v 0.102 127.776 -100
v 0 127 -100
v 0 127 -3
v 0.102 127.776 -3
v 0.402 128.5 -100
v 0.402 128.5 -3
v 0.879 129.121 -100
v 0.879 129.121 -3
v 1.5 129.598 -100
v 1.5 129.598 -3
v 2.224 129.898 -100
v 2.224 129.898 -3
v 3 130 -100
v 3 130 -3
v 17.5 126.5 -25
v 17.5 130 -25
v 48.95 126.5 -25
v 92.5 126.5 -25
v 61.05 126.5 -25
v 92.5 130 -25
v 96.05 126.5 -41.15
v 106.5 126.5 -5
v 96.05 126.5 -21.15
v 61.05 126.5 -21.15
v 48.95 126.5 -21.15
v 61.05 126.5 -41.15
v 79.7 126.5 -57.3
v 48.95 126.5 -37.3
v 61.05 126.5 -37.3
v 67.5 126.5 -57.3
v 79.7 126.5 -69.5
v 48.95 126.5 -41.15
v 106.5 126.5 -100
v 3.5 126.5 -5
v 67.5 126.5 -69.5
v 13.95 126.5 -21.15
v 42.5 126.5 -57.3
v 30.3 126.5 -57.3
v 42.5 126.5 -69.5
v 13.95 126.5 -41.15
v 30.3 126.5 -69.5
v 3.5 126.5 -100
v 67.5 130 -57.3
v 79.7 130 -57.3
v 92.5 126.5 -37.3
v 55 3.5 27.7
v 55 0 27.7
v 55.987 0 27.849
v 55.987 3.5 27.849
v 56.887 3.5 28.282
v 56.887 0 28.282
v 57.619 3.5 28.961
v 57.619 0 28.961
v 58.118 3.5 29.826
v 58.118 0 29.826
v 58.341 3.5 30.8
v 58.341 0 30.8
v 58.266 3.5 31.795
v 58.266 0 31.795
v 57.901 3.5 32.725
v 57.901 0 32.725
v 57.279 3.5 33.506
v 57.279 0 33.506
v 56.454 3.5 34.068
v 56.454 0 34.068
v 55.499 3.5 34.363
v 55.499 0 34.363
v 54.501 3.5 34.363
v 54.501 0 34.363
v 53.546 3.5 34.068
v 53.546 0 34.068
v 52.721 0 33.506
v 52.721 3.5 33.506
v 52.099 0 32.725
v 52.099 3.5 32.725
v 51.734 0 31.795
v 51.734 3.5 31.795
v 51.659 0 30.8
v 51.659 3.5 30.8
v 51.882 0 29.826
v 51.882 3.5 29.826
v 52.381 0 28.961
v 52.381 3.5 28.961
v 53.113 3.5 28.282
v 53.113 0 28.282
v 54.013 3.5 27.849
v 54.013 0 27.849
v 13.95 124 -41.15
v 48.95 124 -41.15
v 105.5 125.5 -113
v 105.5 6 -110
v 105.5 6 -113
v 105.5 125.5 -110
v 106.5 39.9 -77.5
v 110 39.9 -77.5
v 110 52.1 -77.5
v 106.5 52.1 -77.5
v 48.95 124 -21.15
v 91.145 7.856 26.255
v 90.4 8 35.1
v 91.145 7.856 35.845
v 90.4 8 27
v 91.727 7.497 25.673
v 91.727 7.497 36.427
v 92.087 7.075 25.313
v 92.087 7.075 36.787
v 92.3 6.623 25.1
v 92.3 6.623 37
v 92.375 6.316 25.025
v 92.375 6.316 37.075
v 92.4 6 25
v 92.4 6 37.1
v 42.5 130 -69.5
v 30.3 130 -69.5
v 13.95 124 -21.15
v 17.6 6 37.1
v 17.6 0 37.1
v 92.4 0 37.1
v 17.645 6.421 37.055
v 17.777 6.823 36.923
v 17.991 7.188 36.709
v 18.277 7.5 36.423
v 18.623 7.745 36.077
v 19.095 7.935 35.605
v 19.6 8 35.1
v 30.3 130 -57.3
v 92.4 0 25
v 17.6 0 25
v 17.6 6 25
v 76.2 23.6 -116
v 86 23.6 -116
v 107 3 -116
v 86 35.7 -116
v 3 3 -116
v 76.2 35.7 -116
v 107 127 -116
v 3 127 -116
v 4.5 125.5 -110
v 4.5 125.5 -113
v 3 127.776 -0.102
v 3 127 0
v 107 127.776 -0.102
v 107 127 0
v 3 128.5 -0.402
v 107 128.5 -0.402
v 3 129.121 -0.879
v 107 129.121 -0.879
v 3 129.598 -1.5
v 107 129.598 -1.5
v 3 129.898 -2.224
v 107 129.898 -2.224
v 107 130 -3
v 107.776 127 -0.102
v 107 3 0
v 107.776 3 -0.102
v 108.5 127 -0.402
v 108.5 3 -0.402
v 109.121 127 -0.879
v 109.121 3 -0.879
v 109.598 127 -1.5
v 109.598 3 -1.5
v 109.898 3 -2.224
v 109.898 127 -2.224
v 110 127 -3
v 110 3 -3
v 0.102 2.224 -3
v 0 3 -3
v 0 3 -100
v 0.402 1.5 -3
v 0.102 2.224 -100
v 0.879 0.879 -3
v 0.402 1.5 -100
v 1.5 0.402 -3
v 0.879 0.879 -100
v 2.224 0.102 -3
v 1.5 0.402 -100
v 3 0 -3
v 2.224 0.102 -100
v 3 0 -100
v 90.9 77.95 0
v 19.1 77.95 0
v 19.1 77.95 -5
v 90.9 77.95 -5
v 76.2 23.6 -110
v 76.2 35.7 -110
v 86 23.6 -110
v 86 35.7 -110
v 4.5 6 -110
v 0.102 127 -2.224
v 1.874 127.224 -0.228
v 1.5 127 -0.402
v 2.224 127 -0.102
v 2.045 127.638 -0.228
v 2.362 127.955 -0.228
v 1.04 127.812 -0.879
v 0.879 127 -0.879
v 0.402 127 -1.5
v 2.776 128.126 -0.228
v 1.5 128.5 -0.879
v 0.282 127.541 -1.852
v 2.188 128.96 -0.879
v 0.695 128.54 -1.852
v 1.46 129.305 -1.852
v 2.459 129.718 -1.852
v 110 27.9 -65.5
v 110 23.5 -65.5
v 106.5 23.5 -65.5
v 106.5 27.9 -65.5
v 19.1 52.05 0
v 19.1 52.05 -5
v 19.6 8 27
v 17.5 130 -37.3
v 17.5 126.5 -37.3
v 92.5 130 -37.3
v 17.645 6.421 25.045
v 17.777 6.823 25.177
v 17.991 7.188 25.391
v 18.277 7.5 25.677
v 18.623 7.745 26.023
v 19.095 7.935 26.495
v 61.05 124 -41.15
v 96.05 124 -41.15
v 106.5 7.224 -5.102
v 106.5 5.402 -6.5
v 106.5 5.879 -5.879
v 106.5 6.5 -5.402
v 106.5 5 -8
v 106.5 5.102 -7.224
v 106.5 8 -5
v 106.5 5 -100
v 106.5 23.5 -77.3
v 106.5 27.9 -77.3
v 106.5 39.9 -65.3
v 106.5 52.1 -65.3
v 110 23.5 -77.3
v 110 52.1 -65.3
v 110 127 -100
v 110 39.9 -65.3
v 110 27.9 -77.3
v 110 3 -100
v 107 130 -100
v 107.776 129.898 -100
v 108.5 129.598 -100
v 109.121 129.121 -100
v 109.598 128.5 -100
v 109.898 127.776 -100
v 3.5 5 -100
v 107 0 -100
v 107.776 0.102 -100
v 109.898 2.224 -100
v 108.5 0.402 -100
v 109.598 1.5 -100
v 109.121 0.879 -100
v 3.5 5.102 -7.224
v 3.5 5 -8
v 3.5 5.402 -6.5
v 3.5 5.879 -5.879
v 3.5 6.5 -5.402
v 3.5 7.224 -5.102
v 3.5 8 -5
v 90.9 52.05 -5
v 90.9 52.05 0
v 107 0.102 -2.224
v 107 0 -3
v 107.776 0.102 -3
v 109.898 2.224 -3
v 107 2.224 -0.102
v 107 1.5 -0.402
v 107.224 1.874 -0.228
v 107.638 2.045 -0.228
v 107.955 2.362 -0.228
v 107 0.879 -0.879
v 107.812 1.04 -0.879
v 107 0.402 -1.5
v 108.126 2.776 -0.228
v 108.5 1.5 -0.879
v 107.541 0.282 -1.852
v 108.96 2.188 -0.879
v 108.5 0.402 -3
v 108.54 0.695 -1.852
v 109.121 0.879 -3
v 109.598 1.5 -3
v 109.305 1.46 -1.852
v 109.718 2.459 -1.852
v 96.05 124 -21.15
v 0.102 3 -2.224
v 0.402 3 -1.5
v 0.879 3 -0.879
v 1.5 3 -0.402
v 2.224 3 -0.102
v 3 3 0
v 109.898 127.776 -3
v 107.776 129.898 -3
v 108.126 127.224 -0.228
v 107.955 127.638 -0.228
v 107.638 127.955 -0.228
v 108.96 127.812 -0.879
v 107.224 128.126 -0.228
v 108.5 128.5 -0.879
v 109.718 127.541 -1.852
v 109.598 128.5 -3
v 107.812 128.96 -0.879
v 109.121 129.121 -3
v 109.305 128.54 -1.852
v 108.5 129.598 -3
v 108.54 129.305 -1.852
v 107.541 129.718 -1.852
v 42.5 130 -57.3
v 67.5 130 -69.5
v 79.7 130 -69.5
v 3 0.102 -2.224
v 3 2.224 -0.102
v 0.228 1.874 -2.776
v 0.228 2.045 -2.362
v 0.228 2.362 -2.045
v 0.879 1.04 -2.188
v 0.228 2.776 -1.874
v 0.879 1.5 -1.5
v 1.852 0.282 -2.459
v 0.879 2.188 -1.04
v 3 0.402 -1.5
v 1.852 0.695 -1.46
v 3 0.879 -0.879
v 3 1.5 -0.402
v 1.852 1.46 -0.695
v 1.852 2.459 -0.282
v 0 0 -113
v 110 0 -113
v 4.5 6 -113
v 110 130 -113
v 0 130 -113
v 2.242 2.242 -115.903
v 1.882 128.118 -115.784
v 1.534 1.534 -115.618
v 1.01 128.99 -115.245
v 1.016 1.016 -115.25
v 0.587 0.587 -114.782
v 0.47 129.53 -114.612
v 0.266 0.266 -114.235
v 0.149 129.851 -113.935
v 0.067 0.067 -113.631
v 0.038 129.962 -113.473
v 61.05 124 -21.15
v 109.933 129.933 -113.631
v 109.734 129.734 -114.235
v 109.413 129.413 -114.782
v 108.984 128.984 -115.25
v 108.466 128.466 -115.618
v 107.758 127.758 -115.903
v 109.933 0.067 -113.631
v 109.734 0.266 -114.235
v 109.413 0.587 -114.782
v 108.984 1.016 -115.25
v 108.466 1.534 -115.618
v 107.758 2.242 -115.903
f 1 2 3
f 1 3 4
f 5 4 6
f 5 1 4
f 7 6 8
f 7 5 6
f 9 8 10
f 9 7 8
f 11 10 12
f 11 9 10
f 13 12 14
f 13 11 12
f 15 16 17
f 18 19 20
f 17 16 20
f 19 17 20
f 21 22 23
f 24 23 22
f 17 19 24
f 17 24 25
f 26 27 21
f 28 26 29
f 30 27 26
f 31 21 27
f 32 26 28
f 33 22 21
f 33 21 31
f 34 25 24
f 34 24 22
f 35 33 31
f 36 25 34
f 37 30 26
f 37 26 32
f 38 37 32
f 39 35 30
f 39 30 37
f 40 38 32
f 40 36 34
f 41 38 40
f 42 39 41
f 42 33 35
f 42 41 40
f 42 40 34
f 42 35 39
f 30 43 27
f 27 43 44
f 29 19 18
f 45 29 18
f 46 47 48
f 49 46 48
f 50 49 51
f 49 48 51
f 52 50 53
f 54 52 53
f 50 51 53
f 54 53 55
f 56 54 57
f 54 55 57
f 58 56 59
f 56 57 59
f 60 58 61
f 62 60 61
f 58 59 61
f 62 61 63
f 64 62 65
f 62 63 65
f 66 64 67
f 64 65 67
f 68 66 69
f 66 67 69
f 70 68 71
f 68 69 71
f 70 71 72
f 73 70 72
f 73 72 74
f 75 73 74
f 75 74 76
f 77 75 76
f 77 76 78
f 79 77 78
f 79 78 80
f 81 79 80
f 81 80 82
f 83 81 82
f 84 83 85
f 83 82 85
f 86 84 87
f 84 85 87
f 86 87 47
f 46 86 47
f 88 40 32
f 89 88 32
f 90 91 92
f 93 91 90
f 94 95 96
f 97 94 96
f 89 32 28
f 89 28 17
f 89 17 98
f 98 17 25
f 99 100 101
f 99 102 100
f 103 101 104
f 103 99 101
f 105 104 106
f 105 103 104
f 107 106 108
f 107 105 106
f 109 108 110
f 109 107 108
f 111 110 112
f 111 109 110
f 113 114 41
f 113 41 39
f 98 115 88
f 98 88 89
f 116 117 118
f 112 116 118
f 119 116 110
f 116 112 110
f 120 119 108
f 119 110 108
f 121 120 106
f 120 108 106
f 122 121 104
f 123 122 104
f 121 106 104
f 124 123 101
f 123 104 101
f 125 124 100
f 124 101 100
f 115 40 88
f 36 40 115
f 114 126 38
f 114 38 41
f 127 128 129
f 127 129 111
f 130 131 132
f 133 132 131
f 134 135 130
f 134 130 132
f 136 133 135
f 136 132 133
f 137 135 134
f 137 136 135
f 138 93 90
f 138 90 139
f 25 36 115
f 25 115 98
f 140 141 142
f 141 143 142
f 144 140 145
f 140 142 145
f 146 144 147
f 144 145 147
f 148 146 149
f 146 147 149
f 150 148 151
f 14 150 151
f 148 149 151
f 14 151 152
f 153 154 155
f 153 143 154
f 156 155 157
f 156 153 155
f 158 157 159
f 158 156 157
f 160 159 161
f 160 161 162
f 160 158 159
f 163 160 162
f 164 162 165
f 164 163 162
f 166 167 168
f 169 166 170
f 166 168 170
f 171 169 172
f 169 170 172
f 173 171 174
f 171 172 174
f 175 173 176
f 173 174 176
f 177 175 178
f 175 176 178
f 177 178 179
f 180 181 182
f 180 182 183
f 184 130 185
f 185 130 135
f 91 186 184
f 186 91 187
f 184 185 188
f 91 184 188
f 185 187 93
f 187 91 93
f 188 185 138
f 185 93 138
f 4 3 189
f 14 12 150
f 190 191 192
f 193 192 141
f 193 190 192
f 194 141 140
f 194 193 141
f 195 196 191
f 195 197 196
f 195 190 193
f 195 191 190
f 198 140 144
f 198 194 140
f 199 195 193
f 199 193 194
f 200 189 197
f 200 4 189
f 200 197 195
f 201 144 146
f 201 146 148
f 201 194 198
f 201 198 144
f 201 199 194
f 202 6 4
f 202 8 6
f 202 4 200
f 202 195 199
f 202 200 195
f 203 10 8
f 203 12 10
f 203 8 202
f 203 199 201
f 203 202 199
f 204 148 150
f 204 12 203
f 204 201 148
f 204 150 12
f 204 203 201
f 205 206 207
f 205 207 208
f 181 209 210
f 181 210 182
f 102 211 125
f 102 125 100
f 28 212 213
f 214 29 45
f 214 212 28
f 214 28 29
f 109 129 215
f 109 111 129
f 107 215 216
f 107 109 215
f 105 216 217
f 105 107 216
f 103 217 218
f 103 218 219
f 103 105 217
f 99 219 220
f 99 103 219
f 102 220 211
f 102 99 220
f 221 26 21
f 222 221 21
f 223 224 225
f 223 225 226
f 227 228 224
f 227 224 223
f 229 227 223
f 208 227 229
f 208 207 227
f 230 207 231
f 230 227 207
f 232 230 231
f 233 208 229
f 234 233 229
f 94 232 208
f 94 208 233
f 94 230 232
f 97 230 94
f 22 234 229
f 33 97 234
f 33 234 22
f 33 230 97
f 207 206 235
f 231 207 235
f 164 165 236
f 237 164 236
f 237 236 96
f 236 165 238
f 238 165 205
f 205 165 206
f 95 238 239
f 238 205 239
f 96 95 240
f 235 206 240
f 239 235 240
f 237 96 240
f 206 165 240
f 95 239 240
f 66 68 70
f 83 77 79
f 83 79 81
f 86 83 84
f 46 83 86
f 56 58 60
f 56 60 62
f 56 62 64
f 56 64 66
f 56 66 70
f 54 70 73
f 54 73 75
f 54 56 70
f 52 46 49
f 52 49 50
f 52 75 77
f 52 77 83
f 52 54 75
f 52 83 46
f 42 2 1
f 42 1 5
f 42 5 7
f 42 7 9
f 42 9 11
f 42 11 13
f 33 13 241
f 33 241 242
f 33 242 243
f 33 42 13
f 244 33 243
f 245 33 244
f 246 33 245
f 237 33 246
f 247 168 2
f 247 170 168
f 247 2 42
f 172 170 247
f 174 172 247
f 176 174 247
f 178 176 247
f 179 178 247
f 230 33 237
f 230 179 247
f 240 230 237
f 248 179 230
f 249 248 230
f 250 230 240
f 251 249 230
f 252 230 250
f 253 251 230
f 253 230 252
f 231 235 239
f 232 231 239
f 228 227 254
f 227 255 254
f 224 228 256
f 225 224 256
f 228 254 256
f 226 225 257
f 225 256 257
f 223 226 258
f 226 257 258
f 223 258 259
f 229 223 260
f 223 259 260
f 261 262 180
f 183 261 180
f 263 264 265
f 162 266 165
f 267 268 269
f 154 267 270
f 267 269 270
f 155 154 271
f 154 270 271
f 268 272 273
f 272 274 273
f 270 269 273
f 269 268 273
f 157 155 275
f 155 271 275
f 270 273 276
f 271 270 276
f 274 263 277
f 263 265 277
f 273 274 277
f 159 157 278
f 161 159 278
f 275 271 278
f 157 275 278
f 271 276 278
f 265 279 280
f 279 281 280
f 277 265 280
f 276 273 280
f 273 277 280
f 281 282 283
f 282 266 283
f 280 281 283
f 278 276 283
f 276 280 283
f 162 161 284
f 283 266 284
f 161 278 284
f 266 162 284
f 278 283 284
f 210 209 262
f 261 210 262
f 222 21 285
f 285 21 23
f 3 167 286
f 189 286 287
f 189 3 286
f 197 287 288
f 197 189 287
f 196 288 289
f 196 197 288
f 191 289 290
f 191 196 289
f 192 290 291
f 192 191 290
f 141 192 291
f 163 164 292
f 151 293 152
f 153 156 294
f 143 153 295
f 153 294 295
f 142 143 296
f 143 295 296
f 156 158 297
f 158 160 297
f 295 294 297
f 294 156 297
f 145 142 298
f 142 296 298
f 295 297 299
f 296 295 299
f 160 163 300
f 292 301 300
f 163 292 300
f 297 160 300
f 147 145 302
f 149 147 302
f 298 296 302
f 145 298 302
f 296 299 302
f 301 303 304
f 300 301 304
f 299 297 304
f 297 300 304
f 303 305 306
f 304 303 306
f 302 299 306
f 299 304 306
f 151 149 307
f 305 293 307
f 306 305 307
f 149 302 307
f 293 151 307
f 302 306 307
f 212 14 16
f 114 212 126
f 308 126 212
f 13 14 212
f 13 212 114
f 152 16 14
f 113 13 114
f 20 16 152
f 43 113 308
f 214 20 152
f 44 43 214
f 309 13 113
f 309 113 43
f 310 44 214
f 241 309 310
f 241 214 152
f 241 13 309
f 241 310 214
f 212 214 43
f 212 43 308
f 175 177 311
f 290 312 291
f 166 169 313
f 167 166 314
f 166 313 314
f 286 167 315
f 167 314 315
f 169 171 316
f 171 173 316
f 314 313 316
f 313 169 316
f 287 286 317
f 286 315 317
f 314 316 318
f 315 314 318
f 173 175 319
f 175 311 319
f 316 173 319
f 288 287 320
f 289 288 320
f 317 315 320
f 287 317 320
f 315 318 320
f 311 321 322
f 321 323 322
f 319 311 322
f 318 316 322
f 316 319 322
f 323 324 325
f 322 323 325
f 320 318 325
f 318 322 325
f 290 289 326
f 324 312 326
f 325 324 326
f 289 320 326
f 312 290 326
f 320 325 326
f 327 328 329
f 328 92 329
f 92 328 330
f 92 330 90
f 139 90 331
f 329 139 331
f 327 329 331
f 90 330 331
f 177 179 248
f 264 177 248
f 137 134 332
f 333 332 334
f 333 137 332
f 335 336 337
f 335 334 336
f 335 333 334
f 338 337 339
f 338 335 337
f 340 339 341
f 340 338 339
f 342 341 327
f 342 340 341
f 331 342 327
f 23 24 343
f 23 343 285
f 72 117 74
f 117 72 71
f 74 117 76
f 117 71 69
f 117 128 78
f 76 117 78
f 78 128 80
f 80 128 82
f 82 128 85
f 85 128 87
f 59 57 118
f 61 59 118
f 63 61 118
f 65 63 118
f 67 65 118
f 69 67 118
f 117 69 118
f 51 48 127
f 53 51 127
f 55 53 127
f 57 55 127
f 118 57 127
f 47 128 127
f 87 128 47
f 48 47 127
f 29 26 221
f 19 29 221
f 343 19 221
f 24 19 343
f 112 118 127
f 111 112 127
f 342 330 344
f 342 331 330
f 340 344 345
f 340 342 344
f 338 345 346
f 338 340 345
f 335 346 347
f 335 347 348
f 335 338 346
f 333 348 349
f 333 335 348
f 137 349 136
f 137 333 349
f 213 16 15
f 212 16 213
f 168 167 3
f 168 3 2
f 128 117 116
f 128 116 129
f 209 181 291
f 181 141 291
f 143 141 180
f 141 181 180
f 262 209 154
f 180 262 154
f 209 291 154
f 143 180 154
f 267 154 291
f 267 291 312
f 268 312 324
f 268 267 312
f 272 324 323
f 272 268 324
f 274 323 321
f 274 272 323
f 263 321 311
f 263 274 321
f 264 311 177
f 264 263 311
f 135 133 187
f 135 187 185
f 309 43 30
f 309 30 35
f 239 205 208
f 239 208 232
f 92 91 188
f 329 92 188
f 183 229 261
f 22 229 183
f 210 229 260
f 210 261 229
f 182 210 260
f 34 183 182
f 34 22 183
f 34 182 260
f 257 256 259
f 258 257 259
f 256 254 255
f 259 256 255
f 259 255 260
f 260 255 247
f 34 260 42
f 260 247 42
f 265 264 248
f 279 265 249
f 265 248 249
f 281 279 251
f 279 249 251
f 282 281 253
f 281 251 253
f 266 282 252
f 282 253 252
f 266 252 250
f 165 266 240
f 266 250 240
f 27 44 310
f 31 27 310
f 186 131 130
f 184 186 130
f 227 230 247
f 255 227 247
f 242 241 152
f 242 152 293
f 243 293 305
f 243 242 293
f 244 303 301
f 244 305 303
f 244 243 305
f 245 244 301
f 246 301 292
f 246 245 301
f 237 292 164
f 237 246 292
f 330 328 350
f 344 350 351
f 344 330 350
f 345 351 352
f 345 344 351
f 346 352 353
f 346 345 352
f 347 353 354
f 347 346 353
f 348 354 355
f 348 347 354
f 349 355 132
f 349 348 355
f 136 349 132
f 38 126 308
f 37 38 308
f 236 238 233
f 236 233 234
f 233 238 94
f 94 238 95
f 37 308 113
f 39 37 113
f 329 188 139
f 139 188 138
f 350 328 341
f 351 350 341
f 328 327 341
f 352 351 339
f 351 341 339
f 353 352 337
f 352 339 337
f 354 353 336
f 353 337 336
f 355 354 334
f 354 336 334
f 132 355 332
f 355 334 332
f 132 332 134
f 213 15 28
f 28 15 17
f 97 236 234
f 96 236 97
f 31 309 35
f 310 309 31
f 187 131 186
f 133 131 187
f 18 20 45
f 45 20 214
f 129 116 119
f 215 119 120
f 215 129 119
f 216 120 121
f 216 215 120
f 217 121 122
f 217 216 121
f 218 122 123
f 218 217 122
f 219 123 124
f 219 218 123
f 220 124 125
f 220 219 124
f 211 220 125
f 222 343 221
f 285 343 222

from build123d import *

# Parameters (mm, degrees)
SKETCH1_W           = 110
SKETCH1_H           = 100
BOSS_EXTRUDE1_DEPTH = 130
SKETCH2_W           = 103
SKETCH2_H           = 121.5
CUT_EXTRUDE1_DEPTH  = 95
SKETCH3_W           = 71.8
SKETCH3_H           = 25.9
CUT_EXTRUDE2_DEPTH  = 5
SKETCH4_W           = 75
SKETCH4_H           = 12.3
SKETCH4_W_2         = 12.2
SKETCH4_H_2         = 12.2
CUT_EXTRUDE3_DEPTH  = 3.5
SKETCH5_W           = 101
SKETCH5_H           = 119.5
BOSS_EXTRUDE2_DEPTH = 3
SKETCH7_W           = 110
SKETCH7_H           = 130
BOSS_EXTRUDE3_DEPTH = 3
SKETCH8_W           = 11.8
SKETCH8_H           = 4.4
SKETCH8_W_2         = 12.2
SKETCH8_H_2         = 12.2
CUT_EXTRUDE4_DEPTH  = 3.5
SKETCH9_W           = 9.8
SKETCH9_H           = 12.1
CUT_EXTRUDE5_DEPTH  = 6
SKETCH10_W          = 74.8
SKETCH10_H          = 12.1
BOSS_EXTRUDE4_DEPTH = 8
SKETCH11_R          = 3.35
CUT_EXTRUDE6_DEPTH  = 3.5
FILLET1_R           = 3
FILLET2_R           = 3
FILLET3_R           = 2
SKETCH13_W          = 35
SKETCH13_H          = 20
BOSS_EXTRUDE5_DEPTH = 2.5


with BuildPart() as part:
    # Sketch1 → Boss-Extrude1 (new body)
    with BuildSketch(Plane(origin=(0, 0, 0), x_dir=(1, 0, 0), z_dir=(0, 1, 0))):
        with Locations((55, 50)):
            Rectangle(SKETCH1_W, SKETCH1_H)
    extrude(amount=BOSS_EXTRUDE1_DEPTH)

    # Sketch2 → Cut-Extrude1 (cut)
    with BuildSketch(Plane(origin=(0, 0, -100), x_dir=(-1, 0, 0), z_dir=(0, 0, -1))):
        with Locations((-55, 65.75)):
            Rectangle(SKETCH2_W, SKETCH2_H)
    extrude(amount=-CUT_EXTRUDE1_DEPTH, mode=Mode.SUBTRACT)

    # Sketch3 → Cut-Extrude2 (cut)
    with BuildSketch(Plane.XY):
        with Locations((55, 65)):
            Rectangle(SKETCH3_W, SKETCH3_H)
    extrude(amount=-CUT_EXTRUDE2_DEPTH, mode=Mode.SUBTRACT)

    # Sketch4 → Cut-Extrude3 (cut)
    with BuildSketch(Plane(origin=(0, 130, 0), x_dir=(1, 0, 0), z_dir=(0, 1, 0))):
        with Locations((55, 31.15)):
            Rectangle(SKETCH4_W, SKETCH4_H)
        with Locations((73.6, 63.4)):
            Rectangle(SKETCH4_W_2, SKETCH4_H_2)
        with Locations((36.4, 63.4)):
            Rectangle(SKETCH4_W_2, SKETCH4_H_2)
    extrude(amount=-CUT_EXTRUDE3_DEPTH, mode=Mode.SUBTRACT)

    # Sketch8 → Cut-Extrude4 (cut)
    with BuildSketch(Plane(origin=(110, 0, 0), x_dir=(0, 0, -1), z_dir=(1, 0, 0))):
        with Locations((71.4, 25.7)):
            Rectangle(SKETCH8_W, SKETCH8_H)
        with Locations((71.4, 46)):
            Rectangle(SKETCH8_W_2, SKETCH8_H_2)
    extrude(amount=-CUT_EXTRUDE4_DEPTH, mode=Mode.SUBTRACT)

    # Fillet1
    fillet1_edges = [part.edges().sort_by_distance(p)[0] for p in [
        (110, 130, -50),
        (55, 5, -5),
        (0, 130, -50),
        (110, 0, -50),
        (55, 0, 0),
        (0, 0, -50),
        (110, 65, 0),
        (0, 65, 0),
        (55, 130, 0),
    ]]
    fillet(fillet1_edges, radius=FILLET1_R)

    # Sketch13 → Boss-Extrude5 (add)
    with BuildSketch(Plane.XZ.offset(-126.5)):
        with Locations((31.45, -31.15)):
            Rectangle(SKETCH13_W, SKETCH13_H)
        with Locations((78.55, -31.15)):
            Rectangle(SKETCH13_W, SKETCH13_H)
    extrude(amount=BOSS_EXTRUDE5_DEPTH)


with BuildPart() as body_2:
    # Sketch5 → Boss-Extrude2 (new body)
    with BuildSketch(Plane(origin=(0, 0, -110), x_dir=(-1, 0, 0), z_dir=(0, 0, -1))):
        with Locations((-55, 65.75)):
            Rectangle(SKETCH5_W, SKETCH5_H)
    extrude(amount=BOSS_EXTRUDE2_DEPTH)

    # Sketch7 → Boss-Extrude3 (add)
    with BuildSketch(Plane(origin=(0, 0, -113), x_dir=(-1, 0, 0), z_dir=(0, 0, -1))):
        with Locations((-55, 65)):
            Rectangle(SKETCH7_W, SKETCH7_H)
    extrude(amount=BOSS_EXTRUDE3_DEPTH)

    # Sketch9 → Cut-Extrude5 (cut)
    with BuildSketch(Plane(origin=(0, 0, -116), x_dir=(-1, 0, 0), z_dir=(0, 0, -1))):
        with Locations((-81.1, 29.65)):
            Rectangle(SKETCH9_W, SKETCH9_H)
    extrude(amount=-CUT_EXTRUDE5_DEPTH, mode=Mode.SUBTRACT)

    # Fillet2
    fillet2_edges = [body_2.edges().sort_by_distance(p)[0] for p in [
        (55, 0, -116),
        (110, 65, -116),
        (0, 65, -116),
        (55, 130, -116),
    ]]
    fillet(fillet2_edges, radius=FILLET2_R - 0.0001)  # a hair under: the kernel refuses the full size


with BuildPart() as body_3:
    # Sketch10 → Boss-Extrude4 (new body)
    with BuildSketch(Plane(origin=(0, 0, 0), x_dir=(1, 0, 0), z_dir=(0, 1, 0))):
        with Locations((55, -31.05)):
            Rectangle(SKETCH10_W, SKETCH10_H)
    extrude(amount=BOSS_EXTRUDE4_DEPTH)

    # Sketch11 → Cut-Extrude6 (cut)
    with BuildSketch(Plane.XZ):
        with Locations(Location((55, 31.05, 0), (0, 0, 270))):
            Circle(SKETCH11_R)
    extrude(amount=-CUT_EXTRUDE6_DEPTH, mode=Mode.SUBTRACT)

    # Fillet3
    fillet3_edges = [body_3.edges().sort_by_distance(p)[0] for p in [
        (92.4, 8, 31.05),
        (55, 8, 25),
        (17.6, 8, 31.05),
        (55, 8, 37.1),
    ]]
    fillet(fillet3_edges, radius=FILLET3_R)


solid = Compound([part.part, body_2.part, body_3.part])
